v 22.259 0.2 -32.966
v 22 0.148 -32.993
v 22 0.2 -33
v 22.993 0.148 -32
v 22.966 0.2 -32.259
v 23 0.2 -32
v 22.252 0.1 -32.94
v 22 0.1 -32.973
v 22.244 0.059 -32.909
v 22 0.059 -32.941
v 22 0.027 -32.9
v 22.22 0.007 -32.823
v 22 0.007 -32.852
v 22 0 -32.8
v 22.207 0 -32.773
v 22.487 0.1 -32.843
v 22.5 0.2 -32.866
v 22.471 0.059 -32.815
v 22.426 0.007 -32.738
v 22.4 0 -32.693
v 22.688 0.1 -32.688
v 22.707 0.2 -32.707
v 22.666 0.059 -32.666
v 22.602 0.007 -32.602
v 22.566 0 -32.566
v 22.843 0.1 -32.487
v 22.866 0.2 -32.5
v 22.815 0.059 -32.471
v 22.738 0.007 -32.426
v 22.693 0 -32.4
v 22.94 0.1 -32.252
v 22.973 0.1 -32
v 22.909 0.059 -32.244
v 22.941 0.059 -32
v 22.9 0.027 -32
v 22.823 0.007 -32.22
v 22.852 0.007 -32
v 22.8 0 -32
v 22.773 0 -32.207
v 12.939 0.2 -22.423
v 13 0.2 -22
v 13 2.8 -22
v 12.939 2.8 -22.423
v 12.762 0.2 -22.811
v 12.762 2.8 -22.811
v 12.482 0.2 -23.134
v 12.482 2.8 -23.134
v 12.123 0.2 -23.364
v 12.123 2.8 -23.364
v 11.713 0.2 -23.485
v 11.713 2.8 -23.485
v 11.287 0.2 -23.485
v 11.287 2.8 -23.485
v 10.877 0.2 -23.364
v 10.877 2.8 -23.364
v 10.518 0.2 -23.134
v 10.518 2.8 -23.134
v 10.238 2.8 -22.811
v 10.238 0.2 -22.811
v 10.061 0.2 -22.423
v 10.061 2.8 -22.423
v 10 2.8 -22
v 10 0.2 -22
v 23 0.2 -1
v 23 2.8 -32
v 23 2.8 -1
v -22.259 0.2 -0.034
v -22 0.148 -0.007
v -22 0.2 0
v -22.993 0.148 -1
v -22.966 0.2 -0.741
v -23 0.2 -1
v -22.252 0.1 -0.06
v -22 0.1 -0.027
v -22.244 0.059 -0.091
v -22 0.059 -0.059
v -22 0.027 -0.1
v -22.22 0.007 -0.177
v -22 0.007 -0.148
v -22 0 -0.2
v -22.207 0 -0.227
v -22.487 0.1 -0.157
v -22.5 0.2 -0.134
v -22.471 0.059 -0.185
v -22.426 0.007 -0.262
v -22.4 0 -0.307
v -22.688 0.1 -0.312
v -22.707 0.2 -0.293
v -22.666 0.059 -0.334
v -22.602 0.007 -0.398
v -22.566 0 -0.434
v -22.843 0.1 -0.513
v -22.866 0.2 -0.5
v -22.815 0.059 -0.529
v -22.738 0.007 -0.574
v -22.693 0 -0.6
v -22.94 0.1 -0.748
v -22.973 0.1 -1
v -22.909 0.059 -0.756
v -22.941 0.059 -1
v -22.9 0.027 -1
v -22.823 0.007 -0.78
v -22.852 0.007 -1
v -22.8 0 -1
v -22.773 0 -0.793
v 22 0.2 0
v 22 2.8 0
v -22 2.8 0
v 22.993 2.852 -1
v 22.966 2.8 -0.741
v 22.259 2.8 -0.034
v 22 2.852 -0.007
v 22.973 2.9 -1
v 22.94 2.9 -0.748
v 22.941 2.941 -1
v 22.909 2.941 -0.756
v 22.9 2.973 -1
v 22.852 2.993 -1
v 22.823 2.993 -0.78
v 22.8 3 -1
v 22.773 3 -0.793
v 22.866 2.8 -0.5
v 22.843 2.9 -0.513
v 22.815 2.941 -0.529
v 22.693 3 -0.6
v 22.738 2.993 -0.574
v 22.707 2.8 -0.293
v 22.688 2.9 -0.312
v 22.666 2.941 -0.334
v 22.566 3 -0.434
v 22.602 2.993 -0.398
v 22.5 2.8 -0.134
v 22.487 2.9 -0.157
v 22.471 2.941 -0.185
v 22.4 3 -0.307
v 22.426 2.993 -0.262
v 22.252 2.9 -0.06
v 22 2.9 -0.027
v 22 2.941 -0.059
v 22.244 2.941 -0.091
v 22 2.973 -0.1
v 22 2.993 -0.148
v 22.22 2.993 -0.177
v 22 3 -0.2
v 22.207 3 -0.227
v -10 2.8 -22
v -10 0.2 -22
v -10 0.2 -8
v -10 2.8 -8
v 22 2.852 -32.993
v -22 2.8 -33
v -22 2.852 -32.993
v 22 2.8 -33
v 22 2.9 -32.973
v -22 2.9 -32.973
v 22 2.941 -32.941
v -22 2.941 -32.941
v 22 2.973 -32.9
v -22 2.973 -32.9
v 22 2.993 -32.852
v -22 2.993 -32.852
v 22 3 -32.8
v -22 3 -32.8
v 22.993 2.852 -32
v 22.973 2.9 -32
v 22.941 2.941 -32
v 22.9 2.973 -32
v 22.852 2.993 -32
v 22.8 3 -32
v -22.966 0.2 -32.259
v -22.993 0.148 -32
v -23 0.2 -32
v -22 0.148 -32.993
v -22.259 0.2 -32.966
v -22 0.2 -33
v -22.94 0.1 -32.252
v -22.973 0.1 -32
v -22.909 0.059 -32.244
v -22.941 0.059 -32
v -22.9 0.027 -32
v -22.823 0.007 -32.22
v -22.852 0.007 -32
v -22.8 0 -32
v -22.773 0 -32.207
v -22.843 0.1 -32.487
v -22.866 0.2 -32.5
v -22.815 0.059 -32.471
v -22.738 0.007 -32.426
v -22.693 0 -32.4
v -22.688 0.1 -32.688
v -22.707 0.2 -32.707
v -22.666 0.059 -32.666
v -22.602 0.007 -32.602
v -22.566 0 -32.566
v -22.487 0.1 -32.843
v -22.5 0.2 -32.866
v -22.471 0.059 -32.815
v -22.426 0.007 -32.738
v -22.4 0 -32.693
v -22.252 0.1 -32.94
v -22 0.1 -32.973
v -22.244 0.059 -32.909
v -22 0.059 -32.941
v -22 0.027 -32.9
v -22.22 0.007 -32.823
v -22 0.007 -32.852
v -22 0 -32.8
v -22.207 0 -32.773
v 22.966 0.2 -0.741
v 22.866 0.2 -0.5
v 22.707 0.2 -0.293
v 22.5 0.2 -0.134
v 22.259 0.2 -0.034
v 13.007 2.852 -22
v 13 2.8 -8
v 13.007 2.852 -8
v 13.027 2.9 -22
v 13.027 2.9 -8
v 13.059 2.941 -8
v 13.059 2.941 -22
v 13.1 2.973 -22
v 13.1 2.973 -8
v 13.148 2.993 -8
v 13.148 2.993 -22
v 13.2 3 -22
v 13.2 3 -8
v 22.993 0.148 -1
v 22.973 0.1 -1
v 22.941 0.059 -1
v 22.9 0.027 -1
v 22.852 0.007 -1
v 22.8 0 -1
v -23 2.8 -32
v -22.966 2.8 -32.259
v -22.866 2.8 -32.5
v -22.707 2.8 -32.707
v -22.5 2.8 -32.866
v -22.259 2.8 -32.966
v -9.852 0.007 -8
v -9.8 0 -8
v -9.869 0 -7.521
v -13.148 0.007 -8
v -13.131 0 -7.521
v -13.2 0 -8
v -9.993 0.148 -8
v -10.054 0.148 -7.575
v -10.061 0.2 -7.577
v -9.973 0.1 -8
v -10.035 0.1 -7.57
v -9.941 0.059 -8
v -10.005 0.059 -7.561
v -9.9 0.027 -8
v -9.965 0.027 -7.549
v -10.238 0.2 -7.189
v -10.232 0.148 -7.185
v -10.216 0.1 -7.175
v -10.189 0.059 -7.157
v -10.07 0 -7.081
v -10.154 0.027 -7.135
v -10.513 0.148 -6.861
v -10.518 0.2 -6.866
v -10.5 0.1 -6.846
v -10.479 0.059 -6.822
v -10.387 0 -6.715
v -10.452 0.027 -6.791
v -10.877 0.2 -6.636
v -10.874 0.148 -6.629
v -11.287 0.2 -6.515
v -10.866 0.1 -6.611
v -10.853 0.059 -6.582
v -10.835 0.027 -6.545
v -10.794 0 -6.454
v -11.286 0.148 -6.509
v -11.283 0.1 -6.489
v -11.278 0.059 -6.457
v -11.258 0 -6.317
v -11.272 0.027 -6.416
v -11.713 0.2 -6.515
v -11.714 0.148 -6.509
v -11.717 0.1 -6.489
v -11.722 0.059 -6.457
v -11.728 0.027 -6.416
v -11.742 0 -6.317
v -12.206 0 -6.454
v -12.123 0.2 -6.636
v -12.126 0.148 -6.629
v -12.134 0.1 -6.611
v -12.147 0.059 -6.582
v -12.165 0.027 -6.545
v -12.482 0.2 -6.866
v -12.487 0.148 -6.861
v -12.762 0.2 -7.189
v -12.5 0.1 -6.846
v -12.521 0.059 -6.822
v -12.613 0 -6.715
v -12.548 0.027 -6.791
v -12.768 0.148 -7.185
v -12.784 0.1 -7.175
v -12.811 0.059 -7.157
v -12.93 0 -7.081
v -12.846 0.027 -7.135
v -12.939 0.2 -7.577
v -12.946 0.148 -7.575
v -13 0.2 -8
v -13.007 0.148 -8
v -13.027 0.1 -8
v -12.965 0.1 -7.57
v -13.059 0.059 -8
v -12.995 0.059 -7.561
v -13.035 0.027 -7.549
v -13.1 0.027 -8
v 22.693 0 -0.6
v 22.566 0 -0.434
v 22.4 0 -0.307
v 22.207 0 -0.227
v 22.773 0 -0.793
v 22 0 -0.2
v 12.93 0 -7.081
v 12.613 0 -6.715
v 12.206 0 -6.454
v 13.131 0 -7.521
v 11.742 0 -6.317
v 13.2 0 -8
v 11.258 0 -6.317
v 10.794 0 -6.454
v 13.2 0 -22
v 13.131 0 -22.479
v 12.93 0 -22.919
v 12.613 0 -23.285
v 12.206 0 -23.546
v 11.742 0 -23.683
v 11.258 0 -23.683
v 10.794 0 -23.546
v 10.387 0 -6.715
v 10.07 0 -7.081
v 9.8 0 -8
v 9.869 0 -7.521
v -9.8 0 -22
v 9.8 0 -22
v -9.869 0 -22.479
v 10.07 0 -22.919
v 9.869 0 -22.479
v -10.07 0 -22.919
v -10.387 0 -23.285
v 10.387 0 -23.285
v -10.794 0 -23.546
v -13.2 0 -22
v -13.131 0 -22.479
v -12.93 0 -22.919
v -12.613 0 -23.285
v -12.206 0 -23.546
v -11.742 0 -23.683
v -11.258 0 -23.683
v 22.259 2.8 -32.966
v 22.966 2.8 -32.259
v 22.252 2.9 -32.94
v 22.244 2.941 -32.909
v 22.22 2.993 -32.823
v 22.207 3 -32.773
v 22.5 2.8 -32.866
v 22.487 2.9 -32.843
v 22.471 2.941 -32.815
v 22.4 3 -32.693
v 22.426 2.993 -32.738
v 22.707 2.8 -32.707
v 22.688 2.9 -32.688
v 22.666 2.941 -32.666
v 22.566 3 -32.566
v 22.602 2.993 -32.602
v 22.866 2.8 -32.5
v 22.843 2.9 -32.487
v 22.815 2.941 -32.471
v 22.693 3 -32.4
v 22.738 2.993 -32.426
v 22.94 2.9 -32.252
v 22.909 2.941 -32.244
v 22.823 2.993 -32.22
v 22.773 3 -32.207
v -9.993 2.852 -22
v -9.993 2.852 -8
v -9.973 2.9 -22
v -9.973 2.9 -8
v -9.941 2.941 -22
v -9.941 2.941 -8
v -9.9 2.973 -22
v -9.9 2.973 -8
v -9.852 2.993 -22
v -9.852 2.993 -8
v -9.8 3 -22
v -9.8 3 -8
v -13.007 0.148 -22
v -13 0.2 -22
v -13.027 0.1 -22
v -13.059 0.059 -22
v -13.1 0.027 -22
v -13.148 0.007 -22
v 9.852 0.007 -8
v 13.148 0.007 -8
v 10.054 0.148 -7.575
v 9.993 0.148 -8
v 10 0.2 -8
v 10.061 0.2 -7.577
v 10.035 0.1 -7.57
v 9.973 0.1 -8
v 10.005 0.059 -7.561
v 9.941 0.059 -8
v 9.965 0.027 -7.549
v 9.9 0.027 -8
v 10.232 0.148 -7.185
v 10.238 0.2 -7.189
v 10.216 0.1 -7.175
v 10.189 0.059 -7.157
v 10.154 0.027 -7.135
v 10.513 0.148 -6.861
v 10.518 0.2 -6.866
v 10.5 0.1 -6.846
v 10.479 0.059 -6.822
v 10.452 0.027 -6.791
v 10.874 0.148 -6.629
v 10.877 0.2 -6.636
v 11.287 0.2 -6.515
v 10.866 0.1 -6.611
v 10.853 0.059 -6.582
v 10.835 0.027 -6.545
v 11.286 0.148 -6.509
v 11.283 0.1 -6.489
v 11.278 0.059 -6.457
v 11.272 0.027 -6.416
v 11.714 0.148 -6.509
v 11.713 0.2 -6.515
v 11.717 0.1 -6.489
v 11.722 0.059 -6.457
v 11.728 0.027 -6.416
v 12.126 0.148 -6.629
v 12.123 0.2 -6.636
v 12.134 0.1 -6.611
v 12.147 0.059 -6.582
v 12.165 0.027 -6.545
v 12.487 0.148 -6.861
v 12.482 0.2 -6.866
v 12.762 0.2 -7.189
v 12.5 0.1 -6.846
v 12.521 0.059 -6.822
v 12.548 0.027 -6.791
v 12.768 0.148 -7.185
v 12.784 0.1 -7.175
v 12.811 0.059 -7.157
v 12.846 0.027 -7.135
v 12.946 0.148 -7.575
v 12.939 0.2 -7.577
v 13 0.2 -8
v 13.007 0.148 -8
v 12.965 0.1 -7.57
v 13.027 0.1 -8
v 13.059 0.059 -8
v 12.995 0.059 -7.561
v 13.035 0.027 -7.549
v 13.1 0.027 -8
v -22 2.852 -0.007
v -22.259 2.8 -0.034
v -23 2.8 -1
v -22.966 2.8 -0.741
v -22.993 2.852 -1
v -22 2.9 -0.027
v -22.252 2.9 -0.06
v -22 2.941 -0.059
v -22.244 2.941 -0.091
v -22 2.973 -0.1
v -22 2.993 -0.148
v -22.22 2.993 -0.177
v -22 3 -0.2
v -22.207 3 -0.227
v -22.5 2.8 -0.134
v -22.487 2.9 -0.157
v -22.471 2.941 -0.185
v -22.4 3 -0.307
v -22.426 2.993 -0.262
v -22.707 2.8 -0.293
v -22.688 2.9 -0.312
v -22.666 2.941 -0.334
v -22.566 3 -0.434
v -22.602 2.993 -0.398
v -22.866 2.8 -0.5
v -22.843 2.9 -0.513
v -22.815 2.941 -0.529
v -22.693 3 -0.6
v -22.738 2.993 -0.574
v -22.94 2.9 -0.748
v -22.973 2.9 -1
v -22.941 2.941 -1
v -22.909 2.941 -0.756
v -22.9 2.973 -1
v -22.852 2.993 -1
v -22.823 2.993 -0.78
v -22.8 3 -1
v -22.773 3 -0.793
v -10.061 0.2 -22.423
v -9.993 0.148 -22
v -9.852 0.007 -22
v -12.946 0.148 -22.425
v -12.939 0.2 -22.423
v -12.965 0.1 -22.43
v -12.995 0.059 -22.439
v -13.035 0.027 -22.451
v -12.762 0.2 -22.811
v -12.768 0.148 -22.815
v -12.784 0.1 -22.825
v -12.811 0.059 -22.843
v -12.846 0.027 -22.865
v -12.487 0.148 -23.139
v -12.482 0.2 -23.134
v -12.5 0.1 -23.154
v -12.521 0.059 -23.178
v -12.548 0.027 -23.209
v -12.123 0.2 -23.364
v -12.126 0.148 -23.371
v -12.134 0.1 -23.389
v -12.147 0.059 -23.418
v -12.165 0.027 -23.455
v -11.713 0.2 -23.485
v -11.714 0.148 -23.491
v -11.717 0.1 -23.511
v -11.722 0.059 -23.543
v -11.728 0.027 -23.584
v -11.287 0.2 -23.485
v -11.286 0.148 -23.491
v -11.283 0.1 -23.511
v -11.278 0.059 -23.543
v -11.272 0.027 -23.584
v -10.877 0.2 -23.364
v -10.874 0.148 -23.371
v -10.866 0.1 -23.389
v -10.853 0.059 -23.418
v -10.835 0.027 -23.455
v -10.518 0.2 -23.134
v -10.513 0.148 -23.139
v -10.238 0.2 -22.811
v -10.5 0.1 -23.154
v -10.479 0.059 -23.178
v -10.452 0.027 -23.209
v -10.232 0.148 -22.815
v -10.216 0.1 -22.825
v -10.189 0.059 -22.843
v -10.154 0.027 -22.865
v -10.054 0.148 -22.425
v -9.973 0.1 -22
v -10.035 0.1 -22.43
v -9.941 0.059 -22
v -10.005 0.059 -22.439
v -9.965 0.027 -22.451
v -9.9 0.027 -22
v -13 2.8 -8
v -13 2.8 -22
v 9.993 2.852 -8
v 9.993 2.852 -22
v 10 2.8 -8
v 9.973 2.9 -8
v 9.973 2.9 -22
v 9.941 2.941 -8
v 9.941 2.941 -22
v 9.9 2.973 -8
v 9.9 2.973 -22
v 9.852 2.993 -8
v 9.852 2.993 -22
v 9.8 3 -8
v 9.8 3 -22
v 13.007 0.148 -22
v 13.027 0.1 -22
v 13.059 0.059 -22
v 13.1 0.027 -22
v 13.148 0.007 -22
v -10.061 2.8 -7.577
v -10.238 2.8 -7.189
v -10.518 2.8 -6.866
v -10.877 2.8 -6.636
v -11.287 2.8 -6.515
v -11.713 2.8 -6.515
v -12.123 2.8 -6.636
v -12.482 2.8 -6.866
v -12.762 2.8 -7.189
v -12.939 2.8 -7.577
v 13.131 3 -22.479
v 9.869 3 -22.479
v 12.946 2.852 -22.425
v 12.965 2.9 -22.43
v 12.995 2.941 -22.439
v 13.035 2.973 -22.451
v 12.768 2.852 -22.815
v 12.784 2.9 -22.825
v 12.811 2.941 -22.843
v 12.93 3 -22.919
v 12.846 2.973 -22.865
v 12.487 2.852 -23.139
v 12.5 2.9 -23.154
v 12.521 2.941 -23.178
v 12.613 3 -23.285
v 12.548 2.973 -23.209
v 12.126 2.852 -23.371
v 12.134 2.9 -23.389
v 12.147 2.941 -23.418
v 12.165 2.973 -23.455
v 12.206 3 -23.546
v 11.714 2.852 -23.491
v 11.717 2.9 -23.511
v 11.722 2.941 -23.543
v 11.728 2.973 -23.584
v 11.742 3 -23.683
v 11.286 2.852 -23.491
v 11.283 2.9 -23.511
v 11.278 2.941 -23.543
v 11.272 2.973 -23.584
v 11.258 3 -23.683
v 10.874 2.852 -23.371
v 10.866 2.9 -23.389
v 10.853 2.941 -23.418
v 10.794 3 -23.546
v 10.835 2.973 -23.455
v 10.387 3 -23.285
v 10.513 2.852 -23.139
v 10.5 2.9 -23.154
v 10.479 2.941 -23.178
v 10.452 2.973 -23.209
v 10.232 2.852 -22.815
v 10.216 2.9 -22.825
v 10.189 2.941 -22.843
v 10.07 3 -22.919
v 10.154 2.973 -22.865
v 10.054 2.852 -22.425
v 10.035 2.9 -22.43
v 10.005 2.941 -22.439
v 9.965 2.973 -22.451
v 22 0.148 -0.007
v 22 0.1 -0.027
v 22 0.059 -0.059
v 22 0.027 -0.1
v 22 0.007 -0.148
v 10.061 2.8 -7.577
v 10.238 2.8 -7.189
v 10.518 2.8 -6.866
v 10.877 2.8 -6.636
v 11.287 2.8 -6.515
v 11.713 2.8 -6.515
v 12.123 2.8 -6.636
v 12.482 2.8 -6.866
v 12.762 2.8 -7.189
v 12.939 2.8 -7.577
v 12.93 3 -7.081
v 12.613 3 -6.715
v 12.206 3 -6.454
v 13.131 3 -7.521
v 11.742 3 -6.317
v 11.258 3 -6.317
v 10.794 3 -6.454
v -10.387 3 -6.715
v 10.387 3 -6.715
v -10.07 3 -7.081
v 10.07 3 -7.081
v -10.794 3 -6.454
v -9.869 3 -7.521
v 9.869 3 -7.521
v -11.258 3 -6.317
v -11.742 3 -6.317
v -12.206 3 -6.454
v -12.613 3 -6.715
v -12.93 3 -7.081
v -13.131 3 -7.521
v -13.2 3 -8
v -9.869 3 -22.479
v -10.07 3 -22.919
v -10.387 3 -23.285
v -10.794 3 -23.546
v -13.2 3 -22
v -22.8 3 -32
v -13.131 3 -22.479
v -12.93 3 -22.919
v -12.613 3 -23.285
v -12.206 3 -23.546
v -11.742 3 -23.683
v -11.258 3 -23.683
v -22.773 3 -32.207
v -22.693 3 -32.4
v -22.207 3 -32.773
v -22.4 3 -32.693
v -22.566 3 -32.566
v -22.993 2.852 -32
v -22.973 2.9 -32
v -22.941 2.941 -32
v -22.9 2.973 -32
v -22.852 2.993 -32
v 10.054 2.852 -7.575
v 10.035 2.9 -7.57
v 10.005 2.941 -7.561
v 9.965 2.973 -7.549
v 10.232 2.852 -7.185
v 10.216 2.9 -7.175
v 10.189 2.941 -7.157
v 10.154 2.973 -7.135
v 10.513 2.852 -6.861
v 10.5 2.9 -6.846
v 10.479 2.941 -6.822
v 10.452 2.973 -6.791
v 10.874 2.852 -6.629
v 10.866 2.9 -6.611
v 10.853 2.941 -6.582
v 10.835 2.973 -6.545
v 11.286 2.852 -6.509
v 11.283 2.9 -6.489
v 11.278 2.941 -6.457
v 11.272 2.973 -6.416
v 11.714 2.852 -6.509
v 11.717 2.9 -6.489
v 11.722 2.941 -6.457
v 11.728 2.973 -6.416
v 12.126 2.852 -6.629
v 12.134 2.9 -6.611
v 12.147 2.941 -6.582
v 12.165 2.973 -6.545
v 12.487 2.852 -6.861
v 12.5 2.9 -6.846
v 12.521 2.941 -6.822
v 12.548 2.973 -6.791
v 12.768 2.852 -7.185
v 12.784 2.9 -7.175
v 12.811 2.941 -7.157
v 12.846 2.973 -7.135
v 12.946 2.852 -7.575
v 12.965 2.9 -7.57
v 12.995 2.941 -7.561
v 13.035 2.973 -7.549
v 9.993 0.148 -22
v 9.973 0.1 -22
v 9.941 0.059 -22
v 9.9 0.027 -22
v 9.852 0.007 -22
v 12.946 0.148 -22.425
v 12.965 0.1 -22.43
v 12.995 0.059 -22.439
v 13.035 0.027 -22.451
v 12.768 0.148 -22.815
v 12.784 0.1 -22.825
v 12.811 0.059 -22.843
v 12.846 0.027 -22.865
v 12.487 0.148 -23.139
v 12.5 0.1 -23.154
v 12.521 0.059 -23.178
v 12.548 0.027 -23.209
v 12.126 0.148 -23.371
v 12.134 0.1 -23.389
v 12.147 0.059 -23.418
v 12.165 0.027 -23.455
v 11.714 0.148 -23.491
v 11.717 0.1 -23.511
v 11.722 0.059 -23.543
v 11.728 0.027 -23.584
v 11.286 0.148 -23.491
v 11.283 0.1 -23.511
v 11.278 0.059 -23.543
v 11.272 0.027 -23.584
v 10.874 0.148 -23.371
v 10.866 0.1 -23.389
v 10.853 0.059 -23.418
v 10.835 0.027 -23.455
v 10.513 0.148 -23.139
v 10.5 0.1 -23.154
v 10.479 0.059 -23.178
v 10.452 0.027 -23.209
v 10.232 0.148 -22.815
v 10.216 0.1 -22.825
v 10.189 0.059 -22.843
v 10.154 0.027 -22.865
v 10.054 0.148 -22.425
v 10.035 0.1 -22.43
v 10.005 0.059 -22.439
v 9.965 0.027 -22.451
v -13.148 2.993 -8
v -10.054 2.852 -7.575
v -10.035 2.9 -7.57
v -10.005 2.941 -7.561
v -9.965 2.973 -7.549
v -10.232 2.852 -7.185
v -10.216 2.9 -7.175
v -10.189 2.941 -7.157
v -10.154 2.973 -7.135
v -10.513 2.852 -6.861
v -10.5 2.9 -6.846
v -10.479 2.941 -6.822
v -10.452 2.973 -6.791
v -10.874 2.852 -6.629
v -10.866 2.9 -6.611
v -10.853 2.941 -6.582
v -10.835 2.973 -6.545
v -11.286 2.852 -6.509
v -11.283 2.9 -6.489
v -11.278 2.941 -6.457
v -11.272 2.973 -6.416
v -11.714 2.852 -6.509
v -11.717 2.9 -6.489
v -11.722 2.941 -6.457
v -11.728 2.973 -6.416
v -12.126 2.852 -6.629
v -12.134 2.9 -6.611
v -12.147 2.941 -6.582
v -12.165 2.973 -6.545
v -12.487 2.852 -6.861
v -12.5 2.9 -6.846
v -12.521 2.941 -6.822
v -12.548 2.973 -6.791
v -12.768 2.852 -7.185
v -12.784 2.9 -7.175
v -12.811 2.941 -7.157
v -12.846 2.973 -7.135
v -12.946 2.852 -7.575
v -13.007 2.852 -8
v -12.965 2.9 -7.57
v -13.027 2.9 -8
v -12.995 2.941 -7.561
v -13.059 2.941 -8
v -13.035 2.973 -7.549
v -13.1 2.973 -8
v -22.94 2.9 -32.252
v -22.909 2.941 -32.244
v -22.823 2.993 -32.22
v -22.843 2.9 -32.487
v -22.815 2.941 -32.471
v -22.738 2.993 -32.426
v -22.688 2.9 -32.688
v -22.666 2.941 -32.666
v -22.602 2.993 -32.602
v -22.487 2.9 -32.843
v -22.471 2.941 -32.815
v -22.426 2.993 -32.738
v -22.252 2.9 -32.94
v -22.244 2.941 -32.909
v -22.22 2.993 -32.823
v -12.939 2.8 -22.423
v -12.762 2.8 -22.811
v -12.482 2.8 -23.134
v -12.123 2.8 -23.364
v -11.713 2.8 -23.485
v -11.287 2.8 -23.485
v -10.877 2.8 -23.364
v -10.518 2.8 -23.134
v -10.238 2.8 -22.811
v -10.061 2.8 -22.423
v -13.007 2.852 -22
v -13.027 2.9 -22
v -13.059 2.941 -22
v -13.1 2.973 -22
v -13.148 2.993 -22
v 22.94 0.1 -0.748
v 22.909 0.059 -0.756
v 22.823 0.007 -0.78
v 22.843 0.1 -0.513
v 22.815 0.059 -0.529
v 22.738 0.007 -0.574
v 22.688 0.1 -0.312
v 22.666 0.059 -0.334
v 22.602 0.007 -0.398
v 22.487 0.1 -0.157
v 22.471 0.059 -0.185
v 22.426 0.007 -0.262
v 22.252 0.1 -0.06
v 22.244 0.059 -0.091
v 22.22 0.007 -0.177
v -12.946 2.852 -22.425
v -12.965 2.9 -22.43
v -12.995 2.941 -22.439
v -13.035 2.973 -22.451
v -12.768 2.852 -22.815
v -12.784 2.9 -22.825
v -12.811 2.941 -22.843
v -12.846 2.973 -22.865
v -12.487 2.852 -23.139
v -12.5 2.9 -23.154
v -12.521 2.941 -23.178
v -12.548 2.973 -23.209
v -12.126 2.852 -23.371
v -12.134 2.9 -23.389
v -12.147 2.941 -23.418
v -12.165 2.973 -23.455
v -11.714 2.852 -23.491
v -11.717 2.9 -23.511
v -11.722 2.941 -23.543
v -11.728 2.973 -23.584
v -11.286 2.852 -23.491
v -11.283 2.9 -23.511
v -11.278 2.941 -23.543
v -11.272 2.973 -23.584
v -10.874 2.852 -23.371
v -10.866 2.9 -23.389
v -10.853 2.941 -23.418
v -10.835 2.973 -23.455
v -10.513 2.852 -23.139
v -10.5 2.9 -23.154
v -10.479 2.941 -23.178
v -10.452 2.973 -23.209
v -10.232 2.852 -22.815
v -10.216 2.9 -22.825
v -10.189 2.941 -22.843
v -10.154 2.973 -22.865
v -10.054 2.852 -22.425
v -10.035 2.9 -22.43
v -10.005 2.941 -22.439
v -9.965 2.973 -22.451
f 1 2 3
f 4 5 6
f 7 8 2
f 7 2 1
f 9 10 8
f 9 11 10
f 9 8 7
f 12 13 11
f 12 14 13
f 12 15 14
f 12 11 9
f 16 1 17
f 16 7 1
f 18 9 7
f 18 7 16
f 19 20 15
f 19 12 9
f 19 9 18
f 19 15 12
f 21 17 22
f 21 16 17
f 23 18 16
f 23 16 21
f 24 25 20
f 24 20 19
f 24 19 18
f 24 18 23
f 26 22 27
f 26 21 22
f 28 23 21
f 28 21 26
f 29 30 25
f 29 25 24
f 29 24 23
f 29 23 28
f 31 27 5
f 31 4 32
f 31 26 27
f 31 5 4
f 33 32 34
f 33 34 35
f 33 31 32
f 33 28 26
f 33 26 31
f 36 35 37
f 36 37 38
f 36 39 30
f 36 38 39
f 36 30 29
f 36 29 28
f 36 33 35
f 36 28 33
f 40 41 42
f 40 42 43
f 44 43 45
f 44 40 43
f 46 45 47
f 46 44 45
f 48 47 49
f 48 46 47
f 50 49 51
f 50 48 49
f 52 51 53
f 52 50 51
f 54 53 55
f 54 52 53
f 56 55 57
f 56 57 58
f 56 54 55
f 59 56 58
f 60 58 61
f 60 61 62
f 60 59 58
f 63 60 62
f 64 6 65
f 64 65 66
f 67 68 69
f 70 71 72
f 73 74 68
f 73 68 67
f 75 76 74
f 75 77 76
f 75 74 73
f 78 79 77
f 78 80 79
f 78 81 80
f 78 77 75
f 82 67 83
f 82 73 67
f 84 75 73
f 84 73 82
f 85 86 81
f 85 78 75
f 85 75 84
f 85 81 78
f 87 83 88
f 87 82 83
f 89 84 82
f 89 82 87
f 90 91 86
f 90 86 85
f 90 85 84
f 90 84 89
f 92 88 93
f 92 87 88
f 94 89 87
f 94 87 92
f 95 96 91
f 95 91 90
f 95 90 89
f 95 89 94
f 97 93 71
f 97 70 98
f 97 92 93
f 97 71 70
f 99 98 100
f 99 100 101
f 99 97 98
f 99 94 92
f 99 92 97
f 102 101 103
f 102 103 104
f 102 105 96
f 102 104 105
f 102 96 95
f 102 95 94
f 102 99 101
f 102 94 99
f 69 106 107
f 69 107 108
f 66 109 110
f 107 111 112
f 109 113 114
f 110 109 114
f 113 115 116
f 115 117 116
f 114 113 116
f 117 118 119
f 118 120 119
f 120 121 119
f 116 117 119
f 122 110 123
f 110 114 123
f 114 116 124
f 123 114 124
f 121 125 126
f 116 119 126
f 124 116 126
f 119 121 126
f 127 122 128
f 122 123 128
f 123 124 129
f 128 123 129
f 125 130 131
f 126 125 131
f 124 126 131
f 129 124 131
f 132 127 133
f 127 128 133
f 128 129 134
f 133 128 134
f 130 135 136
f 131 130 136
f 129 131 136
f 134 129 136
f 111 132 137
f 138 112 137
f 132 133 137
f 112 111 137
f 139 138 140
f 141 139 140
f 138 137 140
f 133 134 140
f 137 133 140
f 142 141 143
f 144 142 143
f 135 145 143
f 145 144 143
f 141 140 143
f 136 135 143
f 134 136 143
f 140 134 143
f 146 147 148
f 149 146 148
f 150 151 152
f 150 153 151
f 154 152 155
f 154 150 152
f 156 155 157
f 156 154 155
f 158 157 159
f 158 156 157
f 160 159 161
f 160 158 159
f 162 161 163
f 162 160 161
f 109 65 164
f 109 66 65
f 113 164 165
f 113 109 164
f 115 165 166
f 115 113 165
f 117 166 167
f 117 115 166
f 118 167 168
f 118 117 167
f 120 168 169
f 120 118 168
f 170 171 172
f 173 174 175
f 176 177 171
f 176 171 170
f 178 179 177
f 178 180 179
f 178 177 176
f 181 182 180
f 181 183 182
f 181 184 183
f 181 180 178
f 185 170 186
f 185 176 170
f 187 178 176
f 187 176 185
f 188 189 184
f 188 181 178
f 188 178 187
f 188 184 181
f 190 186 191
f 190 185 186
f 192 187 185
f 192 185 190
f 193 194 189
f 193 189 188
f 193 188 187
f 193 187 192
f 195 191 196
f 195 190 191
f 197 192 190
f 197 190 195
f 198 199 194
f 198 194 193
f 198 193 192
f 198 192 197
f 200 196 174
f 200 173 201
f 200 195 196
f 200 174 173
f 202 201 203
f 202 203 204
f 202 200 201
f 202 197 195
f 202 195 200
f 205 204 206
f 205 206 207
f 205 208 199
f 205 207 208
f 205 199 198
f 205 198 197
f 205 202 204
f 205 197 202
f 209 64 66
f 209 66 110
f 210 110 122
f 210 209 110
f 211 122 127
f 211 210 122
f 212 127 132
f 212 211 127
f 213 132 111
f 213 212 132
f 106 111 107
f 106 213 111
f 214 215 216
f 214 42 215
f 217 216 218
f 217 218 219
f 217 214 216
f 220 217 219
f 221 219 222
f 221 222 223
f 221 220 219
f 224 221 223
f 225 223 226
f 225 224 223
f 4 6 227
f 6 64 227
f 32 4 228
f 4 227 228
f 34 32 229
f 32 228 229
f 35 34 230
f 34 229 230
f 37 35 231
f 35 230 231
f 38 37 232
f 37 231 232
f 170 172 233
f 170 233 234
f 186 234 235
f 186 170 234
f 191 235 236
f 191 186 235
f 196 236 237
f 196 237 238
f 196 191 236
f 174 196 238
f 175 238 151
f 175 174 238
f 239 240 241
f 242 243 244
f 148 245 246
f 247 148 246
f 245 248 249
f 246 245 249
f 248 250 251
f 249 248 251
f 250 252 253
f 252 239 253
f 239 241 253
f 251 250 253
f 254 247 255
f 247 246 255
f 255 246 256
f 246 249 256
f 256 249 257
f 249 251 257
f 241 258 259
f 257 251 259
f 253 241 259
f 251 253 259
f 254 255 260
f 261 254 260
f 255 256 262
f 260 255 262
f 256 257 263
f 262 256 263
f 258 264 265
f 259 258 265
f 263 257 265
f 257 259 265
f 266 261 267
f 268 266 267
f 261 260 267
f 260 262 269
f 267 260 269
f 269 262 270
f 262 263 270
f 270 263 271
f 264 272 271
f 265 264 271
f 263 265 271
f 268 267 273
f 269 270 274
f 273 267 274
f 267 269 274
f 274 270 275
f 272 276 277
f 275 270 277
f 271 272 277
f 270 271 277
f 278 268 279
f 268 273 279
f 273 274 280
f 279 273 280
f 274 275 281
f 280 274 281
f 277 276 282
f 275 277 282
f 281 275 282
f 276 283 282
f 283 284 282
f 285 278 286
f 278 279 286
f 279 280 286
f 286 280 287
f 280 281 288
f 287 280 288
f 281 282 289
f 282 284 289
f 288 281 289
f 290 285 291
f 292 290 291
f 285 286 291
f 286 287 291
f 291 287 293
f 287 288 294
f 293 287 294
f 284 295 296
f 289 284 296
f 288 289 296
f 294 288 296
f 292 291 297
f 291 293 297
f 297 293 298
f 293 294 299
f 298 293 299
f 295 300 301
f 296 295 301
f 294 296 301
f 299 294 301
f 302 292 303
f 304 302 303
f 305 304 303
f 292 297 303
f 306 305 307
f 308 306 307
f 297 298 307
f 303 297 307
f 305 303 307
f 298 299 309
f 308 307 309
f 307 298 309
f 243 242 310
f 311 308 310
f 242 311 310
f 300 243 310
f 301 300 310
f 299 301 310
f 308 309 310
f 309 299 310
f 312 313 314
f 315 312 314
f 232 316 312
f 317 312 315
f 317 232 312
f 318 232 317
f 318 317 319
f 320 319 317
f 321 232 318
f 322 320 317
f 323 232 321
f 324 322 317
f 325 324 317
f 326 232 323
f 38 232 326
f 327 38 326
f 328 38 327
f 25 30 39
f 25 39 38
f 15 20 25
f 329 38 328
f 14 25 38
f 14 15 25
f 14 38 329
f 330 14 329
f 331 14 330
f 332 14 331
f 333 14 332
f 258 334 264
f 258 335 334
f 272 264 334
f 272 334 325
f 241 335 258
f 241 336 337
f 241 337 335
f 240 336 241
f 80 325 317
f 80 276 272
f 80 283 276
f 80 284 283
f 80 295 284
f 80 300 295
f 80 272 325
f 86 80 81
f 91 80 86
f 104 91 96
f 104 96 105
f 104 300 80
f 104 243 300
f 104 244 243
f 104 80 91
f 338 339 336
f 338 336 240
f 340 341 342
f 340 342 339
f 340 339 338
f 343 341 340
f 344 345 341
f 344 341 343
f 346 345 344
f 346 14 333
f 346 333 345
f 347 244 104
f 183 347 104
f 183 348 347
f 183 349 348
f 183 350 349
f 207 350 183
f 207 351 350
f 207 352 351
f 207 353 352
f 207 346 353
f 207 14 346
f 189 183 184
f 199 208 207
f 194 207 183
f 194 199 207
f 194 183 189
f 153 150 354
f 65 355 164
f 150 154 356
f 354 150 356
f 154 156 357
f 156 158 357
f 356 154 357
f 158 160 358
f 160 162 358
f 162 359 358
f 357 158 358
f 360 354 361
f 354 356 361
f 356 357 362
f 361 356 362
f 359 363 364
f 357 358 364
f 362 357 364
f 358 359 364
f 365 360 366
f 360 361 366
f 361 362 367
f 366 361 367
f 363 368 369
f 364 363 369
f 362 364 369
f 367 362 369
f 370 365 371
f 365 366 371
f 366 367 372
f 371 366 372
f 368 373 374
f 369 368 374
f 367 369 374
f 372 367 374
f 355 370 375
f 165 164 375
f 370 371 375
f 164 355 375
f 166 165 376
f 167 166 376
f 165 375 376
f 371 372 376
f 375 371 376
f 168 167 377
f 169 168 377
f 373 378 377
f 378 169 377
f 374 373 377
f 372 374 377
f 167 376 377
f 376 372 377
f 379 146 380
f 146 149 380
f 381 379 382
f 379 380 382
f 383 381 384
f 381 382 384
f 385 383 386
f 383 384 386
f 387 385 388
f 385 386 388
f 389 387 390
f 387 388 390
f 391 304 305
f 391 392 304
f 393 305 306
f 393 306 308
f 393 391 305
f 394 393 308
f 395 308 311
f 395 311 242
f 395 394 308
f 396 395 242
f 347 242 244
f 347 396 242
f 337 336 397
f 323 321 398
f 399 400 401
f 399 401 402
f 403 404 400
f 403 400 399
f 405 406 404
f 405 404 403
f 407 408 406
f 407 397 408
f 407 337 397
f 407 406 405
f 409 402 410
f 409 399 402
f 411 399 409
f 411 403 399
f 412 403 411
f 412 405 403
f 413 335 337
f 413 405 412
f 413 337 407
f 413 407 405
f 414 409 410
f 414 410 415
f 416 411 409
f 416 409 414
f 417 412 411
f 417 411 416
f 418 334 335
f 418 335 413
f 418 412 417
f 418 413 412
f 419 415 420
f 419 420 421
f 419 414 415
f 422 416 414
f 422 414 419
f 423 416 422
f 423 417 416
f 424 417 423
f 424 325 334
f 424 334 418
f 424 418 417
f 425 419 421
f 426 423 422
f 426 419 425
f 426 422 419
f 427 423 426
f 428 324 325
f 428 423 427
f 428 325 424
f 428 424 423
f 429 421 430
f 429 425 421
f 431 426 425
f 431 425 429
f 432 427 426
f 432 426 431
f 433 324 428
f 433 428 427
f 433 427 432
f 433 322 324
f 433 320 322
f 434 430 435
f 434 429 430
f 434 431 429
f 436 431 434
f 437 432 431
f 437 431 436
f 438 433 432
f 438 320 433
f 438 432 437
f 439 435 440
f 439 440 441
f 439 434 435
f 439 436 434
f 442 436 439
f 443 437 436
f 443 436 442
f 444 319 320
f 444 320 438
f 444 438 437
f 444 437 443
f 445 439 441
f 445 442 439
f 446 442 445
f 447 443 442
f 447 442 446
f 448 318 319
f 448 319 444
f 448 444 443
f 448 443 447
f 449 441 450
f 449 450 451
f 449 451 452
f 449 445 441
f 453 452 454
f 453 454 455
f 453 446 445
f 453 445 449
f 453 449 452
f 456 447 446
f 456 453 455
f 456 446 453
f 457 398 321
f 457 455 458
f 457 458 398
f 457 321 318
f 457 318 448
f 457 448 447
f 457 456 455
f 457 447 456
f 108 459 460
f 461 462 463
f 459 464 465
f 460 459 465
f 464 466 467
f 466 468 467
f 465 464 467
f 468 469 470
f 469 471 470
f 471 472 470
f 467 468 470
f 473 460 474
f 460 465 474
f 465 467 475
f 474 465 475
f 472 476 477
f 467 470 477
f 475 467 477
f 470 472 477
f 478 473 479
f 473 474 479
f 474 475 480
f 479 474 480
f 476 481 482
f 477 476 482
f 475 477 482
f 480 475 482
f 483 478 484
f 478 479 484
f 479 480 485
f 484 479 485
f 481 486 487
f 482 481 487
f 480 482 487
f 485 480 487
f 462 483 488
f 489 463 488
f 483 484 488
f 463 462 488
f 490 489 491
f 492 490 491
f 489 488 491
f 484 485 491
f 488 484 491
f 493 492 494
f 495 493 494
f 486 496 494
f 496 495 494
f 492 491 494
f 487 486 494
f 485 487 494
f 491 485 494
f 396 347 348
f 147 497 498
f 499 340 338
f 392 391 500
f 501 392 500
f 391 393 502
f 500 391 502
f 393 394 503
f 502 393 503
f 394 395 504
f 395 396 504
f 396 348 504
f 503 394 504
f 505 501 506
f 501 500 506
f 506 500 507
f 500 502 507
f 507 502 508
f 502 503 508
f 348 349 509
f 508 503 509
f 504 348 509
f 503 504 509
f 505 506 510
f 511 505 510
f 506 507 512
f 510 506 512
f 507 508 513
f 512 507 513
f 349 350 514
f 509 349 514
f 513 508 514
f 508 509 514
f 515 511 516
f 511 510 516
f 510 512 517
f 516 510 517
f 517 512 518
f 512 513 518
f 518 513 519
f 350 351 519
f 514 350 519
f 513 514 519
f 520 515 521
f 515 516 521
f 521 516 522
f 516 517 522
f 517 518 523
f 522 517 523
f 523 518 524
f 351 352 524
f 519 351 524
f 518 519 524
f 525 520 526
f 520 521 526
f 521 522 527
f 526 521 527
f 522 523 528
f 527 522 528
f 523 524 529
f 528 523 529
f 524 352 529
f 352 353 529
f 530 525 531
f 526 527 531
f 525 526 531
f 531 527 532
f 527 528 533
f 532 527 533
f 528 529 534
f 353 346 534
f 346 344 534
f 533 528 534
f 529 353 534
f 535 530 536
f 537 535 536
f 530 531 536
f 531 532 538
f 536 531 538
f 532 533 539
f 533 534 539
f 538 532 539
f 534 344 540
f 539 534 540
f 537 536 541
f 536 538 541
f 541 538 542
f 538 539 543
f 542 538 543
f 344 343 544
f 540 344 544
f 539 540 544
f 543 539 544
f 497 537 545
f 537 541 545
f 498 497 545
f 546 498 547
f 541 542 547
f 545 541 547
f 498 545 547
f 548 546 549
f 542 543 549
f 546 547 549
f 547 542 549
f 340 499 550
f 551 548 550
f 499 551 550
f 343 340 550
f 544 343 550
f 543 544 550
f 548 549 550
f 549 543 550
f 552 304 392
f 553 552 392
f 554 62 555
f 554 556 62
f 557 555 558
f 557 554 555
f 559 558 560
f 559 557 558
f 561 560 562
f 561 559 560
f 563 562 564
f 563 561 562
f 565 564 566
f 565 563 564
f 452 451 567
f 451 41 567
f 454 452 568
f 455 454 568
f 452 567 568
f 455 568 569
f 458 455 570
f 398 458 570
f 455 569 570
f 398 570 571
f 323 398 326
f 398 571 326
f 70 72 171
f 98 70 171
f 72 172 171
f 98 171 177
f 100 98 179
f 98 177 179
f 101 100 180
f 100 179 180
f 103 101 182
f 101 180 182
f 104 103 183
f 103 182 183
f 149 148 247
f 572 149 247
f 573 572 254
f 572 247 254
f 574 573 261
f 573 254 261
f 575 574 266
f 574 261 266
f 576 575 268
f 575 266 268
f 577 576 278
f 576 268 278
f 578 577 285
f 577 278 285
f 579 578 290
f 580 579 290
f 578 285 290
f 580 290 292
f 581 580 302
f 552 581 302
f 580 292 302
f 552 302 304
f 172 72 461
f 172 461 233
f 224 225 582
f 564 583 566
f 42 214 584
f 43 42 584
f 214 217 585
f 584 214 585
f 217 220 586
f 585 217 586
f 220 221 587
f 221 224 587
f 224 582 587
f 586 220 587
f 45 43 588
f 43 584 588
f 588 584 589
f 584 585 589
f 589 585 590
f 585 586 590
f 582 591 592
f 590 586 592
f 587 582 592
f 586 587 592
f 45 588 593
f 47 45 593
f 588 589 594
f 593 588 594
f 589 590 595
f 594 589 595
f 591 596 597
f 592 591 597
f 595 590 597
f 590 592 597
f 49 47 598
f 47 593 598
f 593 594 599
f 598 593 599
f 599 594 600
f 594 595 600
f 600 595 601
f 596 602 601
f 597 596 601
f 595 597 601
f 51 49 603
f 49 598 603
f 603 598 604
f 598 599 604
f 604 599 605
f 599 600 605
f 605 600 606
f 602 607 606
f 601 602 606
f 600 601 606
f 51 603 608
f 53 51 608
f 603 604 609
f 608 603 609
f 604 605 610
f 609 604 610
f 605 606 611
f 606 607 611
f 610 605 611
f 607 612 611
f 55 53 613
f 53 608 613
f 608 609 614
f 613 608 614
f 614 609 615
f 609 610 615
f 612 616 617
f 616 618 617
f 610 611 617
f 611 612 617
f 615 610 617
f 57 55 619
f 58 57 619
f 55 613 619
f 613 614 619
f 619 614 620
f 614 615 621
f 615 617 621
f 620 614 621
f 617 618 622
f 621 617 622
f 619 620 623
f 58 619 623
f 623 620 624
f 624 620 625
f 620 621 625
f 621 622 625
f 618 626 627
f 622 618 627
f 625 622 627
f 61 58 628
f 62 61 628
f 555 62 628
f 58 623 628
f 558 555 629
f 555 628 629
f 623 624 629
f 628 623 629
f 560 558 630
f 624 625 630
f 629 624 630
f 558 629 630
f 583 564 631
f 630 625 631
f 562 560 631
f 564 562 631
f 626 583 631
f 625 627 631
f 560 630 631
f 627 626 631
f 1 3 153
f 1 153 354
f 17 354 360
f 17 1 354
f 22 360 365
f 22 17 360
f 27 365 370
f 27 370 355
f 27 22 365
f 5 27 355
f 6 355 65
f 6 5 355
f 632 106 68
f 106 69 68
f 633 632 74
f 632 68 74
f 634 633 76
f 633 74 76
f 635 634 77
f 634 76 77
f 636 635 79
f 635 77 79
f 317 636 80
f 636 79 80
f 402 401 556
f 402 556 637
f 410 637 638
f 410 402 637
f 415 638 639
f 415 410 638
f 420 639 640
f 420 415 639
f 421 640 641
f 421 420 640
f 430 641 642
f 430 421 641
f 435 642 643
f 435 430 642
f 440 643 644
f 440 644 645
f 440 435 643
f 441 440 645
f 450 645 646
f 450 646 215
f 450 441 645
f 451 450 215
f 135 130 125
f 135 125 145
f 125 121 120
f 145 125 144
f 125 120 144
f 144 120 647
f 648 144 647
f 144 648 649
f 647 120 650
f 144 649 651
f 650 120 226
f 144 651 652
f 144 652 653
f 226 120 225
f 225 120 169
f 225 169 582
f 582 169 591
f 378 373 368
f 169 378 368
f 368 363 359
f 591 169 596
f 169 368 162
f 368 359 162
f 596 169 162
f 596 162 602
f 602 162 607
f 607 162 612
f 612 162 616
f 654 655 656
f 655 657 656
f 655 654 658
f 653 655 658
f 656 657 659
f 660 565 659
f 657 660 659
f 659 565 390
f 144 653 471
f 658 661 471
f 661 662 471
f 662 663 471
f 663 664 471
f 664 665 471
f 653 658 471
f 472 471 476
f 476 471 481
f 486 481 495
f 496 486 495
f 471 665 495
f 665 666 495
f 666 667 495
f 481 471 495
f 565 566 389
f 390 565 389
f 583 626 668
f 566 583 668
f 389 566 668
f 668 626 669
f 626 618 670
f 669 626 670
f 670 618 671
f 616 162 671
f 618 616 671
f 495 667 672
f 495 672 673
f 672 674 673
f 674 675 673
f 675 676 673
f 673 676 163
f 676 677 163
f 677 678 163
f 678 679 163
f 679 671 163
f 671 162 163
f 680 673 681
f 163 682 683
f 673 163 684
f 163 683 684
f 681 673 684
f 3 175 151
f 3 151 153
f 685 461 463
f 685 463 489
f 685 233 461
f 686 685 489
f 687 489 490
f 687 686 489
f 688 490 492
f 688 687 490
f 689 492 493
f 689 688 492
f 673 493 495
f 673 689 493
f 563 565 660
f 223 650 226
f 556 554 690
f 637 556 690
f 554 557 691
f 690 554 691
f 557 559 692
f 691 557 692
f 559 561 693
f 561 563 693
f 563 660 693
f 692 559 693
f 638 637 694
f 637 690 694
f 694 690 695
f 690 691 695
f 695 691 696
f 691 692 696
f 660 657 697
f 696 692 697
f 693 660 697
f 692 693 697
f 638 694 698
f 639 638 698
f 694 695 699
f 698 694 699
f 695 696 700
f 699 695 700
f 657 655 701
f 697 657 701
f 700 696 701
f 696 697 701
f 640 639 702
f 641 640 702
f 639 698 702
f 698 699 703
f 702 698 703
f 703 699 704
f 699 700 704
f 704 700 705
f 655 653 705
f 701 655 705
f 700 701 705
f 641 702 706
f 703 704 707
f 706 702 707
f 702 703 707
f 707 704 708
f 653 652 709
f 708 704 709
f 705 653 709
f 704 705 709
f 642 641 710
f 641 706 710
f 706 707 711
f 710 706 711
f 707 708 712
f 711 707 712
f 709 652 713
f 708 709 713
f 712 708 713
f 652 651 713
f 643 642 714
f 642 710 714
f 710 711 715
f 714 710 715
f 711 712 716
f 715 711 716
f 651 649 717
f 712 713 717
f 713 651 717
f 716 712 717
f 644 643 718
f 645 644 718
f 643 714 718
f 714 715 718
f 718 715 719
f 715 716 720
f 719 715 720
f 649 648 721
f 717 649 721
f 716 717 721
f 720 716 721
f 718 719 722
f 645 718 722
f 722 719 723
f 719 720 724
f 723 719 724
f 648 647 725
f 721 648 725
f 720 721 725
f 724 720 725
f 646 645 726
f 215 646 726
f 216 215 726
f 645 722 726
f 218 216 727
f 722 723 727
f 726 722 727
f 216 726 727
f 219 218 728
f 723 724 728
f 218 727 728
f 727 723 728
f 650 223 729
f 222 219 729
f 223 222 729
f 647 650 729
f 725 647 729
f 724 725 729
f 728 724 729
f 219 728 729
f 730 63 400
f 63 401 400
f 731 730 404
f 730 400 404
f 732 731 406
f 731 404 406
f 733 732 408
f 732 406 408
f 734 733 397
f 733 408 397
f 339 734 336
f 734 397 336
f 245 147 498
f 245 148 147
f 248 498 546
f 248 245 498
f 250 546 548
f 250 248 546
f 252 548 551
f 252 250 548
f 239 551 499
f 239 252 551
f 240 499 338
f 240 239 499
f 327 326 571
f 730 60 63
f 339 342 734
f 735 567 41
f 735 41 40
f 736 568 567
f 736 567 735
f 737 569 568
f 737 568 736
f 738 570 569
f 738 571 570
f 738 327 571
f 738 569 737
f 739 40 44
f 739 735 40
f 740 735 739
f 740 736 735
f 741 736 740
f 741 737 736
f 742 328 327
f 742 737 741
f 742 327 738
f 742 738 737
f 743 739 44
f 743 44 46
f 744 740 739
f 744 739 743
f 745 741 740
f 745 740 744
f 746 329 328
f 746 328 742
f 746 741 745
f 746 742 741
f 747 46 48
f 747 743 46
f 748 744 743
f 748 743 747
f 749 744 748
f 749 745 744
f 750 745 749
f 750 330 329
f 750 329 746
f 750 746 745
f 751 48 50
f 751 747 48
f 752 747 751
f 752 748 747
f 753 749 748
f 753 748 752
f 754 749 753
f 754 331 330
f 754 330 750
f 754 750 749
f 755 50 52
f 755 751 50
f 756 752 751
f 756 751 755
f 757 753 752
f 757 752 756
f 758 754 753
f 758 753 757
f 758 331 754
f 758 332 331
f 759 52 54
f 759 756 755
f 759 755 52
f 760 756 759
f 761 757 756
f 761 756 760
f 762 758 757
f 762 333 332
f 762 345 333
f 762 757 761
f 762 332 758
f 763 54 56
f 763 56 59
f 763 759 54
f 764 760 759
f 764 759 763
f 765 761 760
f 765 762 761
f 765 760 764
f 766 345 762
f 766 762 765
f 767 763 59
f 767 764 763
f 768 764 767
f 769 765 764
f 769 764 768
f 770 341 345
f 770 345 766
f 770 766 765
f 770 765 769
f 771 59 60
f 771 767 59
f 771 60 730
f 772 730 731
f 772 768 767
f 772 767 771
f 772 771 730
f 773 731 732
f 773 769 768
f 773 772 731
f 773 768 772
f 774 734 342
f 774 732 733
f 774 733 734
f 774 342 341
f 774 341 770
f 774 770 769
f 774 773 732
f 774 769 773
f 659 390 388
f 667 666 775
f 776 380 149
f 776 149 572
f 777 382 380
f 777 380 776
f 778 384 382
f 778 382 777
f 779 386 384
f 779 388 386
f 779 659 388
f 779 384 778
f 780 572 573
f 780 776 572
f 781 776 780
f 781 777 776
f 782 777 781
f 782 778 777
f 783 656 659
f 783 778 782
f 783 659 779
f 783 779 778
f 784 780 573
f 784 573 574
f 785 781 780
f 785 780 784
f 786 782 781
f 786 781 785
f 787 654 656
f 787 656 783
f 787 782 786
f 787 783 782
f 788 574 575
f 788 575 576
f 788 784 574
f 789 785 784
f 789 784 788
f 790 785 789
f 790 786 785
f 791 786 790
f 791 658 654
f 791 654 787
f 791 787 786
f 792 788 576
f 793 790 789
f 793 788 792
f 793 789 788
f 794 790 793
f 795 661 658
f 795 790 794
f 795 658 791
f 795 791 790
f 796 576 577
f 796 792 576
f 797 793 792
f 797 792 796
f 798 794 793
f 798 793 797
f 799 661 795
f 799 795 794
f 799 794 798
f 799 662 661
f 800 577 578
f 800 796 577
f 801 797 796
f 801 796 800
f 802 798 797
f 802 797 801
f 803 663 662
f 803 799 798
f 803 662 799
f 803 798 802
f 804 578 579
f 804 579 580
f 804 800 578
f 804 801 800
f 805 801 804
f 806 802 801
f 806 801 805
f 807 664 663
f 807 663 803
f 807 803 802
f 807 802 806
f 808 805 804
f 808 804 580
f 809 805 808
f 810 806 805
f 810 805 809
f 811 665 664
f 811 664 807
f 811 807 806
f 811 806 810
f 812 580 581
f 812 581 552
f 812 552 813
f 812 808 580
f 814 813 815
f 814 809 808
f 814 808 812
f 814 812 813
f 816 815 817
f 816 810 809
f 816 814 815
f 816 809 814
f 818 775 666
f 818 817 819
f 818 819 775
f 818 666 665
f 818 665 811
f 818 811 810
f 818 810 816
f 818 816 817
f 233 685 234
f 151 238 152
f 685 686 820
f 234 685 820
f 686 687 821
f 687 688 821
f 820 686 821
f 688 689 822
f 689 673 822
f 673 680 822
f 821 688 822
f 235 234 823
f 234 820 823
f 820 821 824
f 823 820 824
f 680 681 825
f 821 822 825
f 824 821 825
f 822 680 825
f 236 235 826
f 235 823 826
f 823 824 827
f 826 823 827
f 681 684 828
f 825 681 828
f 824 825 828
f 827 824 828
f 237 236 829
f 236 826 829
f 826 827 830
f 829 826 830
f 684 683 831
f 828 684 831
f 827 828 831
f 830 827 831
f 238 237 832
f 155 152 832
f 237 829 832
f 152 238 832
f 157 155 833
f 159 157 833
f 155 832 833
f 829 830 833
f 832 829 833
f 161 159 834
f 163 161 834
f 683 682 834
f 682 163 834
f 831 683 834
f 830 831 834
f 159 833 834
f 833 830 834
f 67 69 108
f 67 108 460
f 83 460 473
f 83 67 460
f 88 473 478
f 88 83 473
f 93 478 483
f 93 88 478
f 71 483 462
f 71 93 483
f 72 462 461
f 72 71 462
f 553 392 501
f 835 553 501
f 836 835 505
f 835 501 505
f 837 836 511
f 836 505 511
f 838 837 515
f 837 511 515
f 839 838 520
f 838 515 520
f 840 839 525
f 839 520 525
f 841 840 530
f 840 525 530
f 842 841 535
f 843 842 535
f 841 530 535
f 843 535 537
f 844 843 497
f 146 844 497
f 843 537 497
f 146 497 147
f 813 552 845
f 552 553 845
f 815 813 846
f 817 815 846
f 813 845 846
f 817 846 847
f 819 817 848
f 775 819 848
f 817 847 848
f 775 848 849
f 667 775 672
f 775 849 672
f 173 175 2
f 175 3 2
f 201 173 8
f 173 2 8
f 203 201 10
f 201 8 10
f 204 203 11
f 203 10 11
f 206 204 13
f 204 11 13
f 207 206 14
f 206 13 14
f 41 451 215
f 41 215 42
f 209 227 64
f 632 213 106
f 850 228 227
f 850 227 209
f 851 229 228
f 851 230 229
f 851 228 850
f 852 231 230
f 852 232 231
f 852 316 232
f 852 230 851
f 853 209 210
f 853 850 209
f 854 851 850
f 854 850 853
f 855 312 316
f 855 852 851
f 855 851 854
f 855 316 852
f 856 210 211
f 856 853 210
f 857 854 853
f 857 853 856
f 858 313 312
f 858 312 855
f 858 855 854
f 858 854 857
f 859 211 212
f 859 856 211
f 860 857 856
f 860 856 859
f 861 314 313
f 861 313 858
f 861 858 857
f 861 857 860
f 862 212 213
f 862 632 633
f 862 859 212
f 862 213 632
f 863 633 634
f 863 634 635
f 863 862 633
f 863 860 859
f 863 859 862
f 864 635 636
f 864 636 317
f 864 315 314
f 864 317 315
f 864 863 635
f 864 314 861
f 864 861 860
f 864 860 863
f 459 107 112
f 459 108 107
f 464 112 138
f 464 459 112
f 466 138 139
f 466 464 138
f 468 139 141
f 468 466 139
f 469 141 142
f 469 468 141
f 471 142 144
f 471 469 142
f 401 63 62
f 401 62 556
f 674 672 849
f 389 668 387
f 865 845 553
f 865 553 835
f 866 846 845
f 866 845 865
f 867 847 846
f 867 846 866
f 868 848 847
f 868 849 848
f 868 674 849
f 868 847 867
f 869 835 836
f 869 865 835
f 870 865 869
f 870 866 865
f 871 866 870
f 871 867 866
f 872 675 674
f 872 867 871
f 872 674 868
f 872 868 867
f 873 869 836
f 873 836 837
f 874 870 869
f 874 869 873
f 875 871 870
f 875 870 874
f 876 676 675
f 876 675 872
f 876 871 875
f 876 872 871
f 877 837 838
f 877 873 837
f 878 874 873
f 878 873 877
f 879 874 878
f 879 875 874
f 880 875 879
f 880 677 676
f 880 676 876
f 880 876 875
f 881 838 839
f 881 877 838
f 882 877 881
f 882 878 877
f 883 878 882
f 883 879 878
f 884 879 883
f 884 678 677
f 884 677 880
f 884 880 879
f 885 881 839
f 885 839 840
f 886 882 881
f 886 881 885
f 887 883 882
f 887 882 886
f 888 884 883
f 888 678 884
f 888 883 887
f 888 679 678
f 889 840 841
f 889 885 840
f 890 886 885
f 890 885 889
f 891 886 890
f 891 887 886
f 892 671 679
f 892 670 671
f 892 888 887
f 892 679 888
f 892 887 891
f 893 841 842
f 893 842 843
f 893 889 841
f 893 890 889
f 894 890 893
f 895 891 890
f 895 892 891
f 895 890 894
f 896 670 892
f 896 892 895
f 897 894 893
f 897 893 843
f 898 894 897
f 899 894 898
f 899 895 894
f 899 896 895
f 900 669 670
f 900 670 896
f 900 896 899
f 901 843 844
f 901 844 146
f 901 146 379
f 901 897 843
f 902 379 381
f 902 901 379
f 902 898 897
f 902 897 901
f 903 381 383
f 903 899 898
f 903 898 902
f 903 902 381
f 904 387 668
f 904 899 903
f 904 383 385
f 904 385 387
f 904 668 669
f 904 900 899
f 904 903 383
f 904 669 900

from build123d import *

# Parameters (mm, degrees)
BOSS_EXTRUDE1_DEPTH = 3
FILLET1_R           = 0.2


with BuildPart() as part:
    # Sketch1 → Boss-Extrude1 (new body)
    with BuildSketch(Plane(origin=(0, 0, 0), x_dir=(1, 0, 0), z_dir=(0, 1, 0))):
        with BuildLine():
            Line((22, 0), (-22, 0))
            ThreePointArc((-22, 0), (-22.707106781, 0.292893219), (-23, 1))
            Line((-23, 1), (-23, 32))
            ThreePointArc((-23, 32), (-22.707106781, 32.707106781), (-22, 33))
            Line((-22, 33), (22, 33))
            ThreePointArc((22, 33), (22.707106781, 32.707106781), (23, 32))
            Line((23, 32), (23, 1))
            ThreePointArc((23, 1), (22.707106781, 0.292893219), (22, 0))
        make_face()
        with BuildLine():
            Line((-10, 22), (-10, 8))
            ThreePointArc((-10, 8), (-11.5, 6.5), (-13, 8))
            Line((-13, 8), (-13, 22))
            ThreePointArc((-13, 22), (-11.5, 23.5), (-10, 22))
        make_face(mode=Mode.SUBTRACT)
        with BuildLine():
            Line((10, 22), (10, 8))
            ThreePointArc((10, 8), (11.5, 6.5), (13, 8))
            Line((13, 8), (13, 22))
            ThreePointArc((13, 22), (11.5, 23.5), (10, 22))
        make_face(mode=Mode.SUBTRACT)
    extrude(amount=BOSS_EXTRUDE1_DEPTH)

    # Fillet1
    fillet1_edges = [part.edges().sort_by_distance(p)[0] for p in [
        (22.707106781, 3, -0.292893219),
        (0, 0, 0),
        (-22.707106781, 0, -0.292893219),
        (23, 3, -16.5),
        (22.707106781, 3, -32.707106781),
        (0, 3, -33),
        (-22.707106781, 3, -32.707106781),
        (-11.5, 0, -23.5),
        (-13, 0, -15),
        (-11.5, 0, -6.5),
        (-10, 0, -15),
        (-23, 3, -16.5),
        (-11.5, 3, -23.5),
        (-13, 3, -15),
        (-11.5, 3, -6.5),
        (-10, 3, -15),
        (11.5, 0, -23.5),
        (10, 0, -15),
        (11.5, 0, -6.5),
        (13, 0, -15),
        (11.5, 3, -23.5),
        (10, 3, -15),
        (11.5, 3, -6.5),
        (13, 3, -15),
        (-22.707106781, 3, -0.292893219),
        (0, 3, 0),
        (-23, 0, -16.5),
        (-22.707106781, 0, -32.707106781),
        (0, 0, -33),
        (22.707106781, 0, -32.707106781),
        (23, 0, -16.5),
        (22.707106781, 0, -0.292893219),
    ]]
    fillet(fillet1_edges, radius=FILLET1_R)


solid = part.part
